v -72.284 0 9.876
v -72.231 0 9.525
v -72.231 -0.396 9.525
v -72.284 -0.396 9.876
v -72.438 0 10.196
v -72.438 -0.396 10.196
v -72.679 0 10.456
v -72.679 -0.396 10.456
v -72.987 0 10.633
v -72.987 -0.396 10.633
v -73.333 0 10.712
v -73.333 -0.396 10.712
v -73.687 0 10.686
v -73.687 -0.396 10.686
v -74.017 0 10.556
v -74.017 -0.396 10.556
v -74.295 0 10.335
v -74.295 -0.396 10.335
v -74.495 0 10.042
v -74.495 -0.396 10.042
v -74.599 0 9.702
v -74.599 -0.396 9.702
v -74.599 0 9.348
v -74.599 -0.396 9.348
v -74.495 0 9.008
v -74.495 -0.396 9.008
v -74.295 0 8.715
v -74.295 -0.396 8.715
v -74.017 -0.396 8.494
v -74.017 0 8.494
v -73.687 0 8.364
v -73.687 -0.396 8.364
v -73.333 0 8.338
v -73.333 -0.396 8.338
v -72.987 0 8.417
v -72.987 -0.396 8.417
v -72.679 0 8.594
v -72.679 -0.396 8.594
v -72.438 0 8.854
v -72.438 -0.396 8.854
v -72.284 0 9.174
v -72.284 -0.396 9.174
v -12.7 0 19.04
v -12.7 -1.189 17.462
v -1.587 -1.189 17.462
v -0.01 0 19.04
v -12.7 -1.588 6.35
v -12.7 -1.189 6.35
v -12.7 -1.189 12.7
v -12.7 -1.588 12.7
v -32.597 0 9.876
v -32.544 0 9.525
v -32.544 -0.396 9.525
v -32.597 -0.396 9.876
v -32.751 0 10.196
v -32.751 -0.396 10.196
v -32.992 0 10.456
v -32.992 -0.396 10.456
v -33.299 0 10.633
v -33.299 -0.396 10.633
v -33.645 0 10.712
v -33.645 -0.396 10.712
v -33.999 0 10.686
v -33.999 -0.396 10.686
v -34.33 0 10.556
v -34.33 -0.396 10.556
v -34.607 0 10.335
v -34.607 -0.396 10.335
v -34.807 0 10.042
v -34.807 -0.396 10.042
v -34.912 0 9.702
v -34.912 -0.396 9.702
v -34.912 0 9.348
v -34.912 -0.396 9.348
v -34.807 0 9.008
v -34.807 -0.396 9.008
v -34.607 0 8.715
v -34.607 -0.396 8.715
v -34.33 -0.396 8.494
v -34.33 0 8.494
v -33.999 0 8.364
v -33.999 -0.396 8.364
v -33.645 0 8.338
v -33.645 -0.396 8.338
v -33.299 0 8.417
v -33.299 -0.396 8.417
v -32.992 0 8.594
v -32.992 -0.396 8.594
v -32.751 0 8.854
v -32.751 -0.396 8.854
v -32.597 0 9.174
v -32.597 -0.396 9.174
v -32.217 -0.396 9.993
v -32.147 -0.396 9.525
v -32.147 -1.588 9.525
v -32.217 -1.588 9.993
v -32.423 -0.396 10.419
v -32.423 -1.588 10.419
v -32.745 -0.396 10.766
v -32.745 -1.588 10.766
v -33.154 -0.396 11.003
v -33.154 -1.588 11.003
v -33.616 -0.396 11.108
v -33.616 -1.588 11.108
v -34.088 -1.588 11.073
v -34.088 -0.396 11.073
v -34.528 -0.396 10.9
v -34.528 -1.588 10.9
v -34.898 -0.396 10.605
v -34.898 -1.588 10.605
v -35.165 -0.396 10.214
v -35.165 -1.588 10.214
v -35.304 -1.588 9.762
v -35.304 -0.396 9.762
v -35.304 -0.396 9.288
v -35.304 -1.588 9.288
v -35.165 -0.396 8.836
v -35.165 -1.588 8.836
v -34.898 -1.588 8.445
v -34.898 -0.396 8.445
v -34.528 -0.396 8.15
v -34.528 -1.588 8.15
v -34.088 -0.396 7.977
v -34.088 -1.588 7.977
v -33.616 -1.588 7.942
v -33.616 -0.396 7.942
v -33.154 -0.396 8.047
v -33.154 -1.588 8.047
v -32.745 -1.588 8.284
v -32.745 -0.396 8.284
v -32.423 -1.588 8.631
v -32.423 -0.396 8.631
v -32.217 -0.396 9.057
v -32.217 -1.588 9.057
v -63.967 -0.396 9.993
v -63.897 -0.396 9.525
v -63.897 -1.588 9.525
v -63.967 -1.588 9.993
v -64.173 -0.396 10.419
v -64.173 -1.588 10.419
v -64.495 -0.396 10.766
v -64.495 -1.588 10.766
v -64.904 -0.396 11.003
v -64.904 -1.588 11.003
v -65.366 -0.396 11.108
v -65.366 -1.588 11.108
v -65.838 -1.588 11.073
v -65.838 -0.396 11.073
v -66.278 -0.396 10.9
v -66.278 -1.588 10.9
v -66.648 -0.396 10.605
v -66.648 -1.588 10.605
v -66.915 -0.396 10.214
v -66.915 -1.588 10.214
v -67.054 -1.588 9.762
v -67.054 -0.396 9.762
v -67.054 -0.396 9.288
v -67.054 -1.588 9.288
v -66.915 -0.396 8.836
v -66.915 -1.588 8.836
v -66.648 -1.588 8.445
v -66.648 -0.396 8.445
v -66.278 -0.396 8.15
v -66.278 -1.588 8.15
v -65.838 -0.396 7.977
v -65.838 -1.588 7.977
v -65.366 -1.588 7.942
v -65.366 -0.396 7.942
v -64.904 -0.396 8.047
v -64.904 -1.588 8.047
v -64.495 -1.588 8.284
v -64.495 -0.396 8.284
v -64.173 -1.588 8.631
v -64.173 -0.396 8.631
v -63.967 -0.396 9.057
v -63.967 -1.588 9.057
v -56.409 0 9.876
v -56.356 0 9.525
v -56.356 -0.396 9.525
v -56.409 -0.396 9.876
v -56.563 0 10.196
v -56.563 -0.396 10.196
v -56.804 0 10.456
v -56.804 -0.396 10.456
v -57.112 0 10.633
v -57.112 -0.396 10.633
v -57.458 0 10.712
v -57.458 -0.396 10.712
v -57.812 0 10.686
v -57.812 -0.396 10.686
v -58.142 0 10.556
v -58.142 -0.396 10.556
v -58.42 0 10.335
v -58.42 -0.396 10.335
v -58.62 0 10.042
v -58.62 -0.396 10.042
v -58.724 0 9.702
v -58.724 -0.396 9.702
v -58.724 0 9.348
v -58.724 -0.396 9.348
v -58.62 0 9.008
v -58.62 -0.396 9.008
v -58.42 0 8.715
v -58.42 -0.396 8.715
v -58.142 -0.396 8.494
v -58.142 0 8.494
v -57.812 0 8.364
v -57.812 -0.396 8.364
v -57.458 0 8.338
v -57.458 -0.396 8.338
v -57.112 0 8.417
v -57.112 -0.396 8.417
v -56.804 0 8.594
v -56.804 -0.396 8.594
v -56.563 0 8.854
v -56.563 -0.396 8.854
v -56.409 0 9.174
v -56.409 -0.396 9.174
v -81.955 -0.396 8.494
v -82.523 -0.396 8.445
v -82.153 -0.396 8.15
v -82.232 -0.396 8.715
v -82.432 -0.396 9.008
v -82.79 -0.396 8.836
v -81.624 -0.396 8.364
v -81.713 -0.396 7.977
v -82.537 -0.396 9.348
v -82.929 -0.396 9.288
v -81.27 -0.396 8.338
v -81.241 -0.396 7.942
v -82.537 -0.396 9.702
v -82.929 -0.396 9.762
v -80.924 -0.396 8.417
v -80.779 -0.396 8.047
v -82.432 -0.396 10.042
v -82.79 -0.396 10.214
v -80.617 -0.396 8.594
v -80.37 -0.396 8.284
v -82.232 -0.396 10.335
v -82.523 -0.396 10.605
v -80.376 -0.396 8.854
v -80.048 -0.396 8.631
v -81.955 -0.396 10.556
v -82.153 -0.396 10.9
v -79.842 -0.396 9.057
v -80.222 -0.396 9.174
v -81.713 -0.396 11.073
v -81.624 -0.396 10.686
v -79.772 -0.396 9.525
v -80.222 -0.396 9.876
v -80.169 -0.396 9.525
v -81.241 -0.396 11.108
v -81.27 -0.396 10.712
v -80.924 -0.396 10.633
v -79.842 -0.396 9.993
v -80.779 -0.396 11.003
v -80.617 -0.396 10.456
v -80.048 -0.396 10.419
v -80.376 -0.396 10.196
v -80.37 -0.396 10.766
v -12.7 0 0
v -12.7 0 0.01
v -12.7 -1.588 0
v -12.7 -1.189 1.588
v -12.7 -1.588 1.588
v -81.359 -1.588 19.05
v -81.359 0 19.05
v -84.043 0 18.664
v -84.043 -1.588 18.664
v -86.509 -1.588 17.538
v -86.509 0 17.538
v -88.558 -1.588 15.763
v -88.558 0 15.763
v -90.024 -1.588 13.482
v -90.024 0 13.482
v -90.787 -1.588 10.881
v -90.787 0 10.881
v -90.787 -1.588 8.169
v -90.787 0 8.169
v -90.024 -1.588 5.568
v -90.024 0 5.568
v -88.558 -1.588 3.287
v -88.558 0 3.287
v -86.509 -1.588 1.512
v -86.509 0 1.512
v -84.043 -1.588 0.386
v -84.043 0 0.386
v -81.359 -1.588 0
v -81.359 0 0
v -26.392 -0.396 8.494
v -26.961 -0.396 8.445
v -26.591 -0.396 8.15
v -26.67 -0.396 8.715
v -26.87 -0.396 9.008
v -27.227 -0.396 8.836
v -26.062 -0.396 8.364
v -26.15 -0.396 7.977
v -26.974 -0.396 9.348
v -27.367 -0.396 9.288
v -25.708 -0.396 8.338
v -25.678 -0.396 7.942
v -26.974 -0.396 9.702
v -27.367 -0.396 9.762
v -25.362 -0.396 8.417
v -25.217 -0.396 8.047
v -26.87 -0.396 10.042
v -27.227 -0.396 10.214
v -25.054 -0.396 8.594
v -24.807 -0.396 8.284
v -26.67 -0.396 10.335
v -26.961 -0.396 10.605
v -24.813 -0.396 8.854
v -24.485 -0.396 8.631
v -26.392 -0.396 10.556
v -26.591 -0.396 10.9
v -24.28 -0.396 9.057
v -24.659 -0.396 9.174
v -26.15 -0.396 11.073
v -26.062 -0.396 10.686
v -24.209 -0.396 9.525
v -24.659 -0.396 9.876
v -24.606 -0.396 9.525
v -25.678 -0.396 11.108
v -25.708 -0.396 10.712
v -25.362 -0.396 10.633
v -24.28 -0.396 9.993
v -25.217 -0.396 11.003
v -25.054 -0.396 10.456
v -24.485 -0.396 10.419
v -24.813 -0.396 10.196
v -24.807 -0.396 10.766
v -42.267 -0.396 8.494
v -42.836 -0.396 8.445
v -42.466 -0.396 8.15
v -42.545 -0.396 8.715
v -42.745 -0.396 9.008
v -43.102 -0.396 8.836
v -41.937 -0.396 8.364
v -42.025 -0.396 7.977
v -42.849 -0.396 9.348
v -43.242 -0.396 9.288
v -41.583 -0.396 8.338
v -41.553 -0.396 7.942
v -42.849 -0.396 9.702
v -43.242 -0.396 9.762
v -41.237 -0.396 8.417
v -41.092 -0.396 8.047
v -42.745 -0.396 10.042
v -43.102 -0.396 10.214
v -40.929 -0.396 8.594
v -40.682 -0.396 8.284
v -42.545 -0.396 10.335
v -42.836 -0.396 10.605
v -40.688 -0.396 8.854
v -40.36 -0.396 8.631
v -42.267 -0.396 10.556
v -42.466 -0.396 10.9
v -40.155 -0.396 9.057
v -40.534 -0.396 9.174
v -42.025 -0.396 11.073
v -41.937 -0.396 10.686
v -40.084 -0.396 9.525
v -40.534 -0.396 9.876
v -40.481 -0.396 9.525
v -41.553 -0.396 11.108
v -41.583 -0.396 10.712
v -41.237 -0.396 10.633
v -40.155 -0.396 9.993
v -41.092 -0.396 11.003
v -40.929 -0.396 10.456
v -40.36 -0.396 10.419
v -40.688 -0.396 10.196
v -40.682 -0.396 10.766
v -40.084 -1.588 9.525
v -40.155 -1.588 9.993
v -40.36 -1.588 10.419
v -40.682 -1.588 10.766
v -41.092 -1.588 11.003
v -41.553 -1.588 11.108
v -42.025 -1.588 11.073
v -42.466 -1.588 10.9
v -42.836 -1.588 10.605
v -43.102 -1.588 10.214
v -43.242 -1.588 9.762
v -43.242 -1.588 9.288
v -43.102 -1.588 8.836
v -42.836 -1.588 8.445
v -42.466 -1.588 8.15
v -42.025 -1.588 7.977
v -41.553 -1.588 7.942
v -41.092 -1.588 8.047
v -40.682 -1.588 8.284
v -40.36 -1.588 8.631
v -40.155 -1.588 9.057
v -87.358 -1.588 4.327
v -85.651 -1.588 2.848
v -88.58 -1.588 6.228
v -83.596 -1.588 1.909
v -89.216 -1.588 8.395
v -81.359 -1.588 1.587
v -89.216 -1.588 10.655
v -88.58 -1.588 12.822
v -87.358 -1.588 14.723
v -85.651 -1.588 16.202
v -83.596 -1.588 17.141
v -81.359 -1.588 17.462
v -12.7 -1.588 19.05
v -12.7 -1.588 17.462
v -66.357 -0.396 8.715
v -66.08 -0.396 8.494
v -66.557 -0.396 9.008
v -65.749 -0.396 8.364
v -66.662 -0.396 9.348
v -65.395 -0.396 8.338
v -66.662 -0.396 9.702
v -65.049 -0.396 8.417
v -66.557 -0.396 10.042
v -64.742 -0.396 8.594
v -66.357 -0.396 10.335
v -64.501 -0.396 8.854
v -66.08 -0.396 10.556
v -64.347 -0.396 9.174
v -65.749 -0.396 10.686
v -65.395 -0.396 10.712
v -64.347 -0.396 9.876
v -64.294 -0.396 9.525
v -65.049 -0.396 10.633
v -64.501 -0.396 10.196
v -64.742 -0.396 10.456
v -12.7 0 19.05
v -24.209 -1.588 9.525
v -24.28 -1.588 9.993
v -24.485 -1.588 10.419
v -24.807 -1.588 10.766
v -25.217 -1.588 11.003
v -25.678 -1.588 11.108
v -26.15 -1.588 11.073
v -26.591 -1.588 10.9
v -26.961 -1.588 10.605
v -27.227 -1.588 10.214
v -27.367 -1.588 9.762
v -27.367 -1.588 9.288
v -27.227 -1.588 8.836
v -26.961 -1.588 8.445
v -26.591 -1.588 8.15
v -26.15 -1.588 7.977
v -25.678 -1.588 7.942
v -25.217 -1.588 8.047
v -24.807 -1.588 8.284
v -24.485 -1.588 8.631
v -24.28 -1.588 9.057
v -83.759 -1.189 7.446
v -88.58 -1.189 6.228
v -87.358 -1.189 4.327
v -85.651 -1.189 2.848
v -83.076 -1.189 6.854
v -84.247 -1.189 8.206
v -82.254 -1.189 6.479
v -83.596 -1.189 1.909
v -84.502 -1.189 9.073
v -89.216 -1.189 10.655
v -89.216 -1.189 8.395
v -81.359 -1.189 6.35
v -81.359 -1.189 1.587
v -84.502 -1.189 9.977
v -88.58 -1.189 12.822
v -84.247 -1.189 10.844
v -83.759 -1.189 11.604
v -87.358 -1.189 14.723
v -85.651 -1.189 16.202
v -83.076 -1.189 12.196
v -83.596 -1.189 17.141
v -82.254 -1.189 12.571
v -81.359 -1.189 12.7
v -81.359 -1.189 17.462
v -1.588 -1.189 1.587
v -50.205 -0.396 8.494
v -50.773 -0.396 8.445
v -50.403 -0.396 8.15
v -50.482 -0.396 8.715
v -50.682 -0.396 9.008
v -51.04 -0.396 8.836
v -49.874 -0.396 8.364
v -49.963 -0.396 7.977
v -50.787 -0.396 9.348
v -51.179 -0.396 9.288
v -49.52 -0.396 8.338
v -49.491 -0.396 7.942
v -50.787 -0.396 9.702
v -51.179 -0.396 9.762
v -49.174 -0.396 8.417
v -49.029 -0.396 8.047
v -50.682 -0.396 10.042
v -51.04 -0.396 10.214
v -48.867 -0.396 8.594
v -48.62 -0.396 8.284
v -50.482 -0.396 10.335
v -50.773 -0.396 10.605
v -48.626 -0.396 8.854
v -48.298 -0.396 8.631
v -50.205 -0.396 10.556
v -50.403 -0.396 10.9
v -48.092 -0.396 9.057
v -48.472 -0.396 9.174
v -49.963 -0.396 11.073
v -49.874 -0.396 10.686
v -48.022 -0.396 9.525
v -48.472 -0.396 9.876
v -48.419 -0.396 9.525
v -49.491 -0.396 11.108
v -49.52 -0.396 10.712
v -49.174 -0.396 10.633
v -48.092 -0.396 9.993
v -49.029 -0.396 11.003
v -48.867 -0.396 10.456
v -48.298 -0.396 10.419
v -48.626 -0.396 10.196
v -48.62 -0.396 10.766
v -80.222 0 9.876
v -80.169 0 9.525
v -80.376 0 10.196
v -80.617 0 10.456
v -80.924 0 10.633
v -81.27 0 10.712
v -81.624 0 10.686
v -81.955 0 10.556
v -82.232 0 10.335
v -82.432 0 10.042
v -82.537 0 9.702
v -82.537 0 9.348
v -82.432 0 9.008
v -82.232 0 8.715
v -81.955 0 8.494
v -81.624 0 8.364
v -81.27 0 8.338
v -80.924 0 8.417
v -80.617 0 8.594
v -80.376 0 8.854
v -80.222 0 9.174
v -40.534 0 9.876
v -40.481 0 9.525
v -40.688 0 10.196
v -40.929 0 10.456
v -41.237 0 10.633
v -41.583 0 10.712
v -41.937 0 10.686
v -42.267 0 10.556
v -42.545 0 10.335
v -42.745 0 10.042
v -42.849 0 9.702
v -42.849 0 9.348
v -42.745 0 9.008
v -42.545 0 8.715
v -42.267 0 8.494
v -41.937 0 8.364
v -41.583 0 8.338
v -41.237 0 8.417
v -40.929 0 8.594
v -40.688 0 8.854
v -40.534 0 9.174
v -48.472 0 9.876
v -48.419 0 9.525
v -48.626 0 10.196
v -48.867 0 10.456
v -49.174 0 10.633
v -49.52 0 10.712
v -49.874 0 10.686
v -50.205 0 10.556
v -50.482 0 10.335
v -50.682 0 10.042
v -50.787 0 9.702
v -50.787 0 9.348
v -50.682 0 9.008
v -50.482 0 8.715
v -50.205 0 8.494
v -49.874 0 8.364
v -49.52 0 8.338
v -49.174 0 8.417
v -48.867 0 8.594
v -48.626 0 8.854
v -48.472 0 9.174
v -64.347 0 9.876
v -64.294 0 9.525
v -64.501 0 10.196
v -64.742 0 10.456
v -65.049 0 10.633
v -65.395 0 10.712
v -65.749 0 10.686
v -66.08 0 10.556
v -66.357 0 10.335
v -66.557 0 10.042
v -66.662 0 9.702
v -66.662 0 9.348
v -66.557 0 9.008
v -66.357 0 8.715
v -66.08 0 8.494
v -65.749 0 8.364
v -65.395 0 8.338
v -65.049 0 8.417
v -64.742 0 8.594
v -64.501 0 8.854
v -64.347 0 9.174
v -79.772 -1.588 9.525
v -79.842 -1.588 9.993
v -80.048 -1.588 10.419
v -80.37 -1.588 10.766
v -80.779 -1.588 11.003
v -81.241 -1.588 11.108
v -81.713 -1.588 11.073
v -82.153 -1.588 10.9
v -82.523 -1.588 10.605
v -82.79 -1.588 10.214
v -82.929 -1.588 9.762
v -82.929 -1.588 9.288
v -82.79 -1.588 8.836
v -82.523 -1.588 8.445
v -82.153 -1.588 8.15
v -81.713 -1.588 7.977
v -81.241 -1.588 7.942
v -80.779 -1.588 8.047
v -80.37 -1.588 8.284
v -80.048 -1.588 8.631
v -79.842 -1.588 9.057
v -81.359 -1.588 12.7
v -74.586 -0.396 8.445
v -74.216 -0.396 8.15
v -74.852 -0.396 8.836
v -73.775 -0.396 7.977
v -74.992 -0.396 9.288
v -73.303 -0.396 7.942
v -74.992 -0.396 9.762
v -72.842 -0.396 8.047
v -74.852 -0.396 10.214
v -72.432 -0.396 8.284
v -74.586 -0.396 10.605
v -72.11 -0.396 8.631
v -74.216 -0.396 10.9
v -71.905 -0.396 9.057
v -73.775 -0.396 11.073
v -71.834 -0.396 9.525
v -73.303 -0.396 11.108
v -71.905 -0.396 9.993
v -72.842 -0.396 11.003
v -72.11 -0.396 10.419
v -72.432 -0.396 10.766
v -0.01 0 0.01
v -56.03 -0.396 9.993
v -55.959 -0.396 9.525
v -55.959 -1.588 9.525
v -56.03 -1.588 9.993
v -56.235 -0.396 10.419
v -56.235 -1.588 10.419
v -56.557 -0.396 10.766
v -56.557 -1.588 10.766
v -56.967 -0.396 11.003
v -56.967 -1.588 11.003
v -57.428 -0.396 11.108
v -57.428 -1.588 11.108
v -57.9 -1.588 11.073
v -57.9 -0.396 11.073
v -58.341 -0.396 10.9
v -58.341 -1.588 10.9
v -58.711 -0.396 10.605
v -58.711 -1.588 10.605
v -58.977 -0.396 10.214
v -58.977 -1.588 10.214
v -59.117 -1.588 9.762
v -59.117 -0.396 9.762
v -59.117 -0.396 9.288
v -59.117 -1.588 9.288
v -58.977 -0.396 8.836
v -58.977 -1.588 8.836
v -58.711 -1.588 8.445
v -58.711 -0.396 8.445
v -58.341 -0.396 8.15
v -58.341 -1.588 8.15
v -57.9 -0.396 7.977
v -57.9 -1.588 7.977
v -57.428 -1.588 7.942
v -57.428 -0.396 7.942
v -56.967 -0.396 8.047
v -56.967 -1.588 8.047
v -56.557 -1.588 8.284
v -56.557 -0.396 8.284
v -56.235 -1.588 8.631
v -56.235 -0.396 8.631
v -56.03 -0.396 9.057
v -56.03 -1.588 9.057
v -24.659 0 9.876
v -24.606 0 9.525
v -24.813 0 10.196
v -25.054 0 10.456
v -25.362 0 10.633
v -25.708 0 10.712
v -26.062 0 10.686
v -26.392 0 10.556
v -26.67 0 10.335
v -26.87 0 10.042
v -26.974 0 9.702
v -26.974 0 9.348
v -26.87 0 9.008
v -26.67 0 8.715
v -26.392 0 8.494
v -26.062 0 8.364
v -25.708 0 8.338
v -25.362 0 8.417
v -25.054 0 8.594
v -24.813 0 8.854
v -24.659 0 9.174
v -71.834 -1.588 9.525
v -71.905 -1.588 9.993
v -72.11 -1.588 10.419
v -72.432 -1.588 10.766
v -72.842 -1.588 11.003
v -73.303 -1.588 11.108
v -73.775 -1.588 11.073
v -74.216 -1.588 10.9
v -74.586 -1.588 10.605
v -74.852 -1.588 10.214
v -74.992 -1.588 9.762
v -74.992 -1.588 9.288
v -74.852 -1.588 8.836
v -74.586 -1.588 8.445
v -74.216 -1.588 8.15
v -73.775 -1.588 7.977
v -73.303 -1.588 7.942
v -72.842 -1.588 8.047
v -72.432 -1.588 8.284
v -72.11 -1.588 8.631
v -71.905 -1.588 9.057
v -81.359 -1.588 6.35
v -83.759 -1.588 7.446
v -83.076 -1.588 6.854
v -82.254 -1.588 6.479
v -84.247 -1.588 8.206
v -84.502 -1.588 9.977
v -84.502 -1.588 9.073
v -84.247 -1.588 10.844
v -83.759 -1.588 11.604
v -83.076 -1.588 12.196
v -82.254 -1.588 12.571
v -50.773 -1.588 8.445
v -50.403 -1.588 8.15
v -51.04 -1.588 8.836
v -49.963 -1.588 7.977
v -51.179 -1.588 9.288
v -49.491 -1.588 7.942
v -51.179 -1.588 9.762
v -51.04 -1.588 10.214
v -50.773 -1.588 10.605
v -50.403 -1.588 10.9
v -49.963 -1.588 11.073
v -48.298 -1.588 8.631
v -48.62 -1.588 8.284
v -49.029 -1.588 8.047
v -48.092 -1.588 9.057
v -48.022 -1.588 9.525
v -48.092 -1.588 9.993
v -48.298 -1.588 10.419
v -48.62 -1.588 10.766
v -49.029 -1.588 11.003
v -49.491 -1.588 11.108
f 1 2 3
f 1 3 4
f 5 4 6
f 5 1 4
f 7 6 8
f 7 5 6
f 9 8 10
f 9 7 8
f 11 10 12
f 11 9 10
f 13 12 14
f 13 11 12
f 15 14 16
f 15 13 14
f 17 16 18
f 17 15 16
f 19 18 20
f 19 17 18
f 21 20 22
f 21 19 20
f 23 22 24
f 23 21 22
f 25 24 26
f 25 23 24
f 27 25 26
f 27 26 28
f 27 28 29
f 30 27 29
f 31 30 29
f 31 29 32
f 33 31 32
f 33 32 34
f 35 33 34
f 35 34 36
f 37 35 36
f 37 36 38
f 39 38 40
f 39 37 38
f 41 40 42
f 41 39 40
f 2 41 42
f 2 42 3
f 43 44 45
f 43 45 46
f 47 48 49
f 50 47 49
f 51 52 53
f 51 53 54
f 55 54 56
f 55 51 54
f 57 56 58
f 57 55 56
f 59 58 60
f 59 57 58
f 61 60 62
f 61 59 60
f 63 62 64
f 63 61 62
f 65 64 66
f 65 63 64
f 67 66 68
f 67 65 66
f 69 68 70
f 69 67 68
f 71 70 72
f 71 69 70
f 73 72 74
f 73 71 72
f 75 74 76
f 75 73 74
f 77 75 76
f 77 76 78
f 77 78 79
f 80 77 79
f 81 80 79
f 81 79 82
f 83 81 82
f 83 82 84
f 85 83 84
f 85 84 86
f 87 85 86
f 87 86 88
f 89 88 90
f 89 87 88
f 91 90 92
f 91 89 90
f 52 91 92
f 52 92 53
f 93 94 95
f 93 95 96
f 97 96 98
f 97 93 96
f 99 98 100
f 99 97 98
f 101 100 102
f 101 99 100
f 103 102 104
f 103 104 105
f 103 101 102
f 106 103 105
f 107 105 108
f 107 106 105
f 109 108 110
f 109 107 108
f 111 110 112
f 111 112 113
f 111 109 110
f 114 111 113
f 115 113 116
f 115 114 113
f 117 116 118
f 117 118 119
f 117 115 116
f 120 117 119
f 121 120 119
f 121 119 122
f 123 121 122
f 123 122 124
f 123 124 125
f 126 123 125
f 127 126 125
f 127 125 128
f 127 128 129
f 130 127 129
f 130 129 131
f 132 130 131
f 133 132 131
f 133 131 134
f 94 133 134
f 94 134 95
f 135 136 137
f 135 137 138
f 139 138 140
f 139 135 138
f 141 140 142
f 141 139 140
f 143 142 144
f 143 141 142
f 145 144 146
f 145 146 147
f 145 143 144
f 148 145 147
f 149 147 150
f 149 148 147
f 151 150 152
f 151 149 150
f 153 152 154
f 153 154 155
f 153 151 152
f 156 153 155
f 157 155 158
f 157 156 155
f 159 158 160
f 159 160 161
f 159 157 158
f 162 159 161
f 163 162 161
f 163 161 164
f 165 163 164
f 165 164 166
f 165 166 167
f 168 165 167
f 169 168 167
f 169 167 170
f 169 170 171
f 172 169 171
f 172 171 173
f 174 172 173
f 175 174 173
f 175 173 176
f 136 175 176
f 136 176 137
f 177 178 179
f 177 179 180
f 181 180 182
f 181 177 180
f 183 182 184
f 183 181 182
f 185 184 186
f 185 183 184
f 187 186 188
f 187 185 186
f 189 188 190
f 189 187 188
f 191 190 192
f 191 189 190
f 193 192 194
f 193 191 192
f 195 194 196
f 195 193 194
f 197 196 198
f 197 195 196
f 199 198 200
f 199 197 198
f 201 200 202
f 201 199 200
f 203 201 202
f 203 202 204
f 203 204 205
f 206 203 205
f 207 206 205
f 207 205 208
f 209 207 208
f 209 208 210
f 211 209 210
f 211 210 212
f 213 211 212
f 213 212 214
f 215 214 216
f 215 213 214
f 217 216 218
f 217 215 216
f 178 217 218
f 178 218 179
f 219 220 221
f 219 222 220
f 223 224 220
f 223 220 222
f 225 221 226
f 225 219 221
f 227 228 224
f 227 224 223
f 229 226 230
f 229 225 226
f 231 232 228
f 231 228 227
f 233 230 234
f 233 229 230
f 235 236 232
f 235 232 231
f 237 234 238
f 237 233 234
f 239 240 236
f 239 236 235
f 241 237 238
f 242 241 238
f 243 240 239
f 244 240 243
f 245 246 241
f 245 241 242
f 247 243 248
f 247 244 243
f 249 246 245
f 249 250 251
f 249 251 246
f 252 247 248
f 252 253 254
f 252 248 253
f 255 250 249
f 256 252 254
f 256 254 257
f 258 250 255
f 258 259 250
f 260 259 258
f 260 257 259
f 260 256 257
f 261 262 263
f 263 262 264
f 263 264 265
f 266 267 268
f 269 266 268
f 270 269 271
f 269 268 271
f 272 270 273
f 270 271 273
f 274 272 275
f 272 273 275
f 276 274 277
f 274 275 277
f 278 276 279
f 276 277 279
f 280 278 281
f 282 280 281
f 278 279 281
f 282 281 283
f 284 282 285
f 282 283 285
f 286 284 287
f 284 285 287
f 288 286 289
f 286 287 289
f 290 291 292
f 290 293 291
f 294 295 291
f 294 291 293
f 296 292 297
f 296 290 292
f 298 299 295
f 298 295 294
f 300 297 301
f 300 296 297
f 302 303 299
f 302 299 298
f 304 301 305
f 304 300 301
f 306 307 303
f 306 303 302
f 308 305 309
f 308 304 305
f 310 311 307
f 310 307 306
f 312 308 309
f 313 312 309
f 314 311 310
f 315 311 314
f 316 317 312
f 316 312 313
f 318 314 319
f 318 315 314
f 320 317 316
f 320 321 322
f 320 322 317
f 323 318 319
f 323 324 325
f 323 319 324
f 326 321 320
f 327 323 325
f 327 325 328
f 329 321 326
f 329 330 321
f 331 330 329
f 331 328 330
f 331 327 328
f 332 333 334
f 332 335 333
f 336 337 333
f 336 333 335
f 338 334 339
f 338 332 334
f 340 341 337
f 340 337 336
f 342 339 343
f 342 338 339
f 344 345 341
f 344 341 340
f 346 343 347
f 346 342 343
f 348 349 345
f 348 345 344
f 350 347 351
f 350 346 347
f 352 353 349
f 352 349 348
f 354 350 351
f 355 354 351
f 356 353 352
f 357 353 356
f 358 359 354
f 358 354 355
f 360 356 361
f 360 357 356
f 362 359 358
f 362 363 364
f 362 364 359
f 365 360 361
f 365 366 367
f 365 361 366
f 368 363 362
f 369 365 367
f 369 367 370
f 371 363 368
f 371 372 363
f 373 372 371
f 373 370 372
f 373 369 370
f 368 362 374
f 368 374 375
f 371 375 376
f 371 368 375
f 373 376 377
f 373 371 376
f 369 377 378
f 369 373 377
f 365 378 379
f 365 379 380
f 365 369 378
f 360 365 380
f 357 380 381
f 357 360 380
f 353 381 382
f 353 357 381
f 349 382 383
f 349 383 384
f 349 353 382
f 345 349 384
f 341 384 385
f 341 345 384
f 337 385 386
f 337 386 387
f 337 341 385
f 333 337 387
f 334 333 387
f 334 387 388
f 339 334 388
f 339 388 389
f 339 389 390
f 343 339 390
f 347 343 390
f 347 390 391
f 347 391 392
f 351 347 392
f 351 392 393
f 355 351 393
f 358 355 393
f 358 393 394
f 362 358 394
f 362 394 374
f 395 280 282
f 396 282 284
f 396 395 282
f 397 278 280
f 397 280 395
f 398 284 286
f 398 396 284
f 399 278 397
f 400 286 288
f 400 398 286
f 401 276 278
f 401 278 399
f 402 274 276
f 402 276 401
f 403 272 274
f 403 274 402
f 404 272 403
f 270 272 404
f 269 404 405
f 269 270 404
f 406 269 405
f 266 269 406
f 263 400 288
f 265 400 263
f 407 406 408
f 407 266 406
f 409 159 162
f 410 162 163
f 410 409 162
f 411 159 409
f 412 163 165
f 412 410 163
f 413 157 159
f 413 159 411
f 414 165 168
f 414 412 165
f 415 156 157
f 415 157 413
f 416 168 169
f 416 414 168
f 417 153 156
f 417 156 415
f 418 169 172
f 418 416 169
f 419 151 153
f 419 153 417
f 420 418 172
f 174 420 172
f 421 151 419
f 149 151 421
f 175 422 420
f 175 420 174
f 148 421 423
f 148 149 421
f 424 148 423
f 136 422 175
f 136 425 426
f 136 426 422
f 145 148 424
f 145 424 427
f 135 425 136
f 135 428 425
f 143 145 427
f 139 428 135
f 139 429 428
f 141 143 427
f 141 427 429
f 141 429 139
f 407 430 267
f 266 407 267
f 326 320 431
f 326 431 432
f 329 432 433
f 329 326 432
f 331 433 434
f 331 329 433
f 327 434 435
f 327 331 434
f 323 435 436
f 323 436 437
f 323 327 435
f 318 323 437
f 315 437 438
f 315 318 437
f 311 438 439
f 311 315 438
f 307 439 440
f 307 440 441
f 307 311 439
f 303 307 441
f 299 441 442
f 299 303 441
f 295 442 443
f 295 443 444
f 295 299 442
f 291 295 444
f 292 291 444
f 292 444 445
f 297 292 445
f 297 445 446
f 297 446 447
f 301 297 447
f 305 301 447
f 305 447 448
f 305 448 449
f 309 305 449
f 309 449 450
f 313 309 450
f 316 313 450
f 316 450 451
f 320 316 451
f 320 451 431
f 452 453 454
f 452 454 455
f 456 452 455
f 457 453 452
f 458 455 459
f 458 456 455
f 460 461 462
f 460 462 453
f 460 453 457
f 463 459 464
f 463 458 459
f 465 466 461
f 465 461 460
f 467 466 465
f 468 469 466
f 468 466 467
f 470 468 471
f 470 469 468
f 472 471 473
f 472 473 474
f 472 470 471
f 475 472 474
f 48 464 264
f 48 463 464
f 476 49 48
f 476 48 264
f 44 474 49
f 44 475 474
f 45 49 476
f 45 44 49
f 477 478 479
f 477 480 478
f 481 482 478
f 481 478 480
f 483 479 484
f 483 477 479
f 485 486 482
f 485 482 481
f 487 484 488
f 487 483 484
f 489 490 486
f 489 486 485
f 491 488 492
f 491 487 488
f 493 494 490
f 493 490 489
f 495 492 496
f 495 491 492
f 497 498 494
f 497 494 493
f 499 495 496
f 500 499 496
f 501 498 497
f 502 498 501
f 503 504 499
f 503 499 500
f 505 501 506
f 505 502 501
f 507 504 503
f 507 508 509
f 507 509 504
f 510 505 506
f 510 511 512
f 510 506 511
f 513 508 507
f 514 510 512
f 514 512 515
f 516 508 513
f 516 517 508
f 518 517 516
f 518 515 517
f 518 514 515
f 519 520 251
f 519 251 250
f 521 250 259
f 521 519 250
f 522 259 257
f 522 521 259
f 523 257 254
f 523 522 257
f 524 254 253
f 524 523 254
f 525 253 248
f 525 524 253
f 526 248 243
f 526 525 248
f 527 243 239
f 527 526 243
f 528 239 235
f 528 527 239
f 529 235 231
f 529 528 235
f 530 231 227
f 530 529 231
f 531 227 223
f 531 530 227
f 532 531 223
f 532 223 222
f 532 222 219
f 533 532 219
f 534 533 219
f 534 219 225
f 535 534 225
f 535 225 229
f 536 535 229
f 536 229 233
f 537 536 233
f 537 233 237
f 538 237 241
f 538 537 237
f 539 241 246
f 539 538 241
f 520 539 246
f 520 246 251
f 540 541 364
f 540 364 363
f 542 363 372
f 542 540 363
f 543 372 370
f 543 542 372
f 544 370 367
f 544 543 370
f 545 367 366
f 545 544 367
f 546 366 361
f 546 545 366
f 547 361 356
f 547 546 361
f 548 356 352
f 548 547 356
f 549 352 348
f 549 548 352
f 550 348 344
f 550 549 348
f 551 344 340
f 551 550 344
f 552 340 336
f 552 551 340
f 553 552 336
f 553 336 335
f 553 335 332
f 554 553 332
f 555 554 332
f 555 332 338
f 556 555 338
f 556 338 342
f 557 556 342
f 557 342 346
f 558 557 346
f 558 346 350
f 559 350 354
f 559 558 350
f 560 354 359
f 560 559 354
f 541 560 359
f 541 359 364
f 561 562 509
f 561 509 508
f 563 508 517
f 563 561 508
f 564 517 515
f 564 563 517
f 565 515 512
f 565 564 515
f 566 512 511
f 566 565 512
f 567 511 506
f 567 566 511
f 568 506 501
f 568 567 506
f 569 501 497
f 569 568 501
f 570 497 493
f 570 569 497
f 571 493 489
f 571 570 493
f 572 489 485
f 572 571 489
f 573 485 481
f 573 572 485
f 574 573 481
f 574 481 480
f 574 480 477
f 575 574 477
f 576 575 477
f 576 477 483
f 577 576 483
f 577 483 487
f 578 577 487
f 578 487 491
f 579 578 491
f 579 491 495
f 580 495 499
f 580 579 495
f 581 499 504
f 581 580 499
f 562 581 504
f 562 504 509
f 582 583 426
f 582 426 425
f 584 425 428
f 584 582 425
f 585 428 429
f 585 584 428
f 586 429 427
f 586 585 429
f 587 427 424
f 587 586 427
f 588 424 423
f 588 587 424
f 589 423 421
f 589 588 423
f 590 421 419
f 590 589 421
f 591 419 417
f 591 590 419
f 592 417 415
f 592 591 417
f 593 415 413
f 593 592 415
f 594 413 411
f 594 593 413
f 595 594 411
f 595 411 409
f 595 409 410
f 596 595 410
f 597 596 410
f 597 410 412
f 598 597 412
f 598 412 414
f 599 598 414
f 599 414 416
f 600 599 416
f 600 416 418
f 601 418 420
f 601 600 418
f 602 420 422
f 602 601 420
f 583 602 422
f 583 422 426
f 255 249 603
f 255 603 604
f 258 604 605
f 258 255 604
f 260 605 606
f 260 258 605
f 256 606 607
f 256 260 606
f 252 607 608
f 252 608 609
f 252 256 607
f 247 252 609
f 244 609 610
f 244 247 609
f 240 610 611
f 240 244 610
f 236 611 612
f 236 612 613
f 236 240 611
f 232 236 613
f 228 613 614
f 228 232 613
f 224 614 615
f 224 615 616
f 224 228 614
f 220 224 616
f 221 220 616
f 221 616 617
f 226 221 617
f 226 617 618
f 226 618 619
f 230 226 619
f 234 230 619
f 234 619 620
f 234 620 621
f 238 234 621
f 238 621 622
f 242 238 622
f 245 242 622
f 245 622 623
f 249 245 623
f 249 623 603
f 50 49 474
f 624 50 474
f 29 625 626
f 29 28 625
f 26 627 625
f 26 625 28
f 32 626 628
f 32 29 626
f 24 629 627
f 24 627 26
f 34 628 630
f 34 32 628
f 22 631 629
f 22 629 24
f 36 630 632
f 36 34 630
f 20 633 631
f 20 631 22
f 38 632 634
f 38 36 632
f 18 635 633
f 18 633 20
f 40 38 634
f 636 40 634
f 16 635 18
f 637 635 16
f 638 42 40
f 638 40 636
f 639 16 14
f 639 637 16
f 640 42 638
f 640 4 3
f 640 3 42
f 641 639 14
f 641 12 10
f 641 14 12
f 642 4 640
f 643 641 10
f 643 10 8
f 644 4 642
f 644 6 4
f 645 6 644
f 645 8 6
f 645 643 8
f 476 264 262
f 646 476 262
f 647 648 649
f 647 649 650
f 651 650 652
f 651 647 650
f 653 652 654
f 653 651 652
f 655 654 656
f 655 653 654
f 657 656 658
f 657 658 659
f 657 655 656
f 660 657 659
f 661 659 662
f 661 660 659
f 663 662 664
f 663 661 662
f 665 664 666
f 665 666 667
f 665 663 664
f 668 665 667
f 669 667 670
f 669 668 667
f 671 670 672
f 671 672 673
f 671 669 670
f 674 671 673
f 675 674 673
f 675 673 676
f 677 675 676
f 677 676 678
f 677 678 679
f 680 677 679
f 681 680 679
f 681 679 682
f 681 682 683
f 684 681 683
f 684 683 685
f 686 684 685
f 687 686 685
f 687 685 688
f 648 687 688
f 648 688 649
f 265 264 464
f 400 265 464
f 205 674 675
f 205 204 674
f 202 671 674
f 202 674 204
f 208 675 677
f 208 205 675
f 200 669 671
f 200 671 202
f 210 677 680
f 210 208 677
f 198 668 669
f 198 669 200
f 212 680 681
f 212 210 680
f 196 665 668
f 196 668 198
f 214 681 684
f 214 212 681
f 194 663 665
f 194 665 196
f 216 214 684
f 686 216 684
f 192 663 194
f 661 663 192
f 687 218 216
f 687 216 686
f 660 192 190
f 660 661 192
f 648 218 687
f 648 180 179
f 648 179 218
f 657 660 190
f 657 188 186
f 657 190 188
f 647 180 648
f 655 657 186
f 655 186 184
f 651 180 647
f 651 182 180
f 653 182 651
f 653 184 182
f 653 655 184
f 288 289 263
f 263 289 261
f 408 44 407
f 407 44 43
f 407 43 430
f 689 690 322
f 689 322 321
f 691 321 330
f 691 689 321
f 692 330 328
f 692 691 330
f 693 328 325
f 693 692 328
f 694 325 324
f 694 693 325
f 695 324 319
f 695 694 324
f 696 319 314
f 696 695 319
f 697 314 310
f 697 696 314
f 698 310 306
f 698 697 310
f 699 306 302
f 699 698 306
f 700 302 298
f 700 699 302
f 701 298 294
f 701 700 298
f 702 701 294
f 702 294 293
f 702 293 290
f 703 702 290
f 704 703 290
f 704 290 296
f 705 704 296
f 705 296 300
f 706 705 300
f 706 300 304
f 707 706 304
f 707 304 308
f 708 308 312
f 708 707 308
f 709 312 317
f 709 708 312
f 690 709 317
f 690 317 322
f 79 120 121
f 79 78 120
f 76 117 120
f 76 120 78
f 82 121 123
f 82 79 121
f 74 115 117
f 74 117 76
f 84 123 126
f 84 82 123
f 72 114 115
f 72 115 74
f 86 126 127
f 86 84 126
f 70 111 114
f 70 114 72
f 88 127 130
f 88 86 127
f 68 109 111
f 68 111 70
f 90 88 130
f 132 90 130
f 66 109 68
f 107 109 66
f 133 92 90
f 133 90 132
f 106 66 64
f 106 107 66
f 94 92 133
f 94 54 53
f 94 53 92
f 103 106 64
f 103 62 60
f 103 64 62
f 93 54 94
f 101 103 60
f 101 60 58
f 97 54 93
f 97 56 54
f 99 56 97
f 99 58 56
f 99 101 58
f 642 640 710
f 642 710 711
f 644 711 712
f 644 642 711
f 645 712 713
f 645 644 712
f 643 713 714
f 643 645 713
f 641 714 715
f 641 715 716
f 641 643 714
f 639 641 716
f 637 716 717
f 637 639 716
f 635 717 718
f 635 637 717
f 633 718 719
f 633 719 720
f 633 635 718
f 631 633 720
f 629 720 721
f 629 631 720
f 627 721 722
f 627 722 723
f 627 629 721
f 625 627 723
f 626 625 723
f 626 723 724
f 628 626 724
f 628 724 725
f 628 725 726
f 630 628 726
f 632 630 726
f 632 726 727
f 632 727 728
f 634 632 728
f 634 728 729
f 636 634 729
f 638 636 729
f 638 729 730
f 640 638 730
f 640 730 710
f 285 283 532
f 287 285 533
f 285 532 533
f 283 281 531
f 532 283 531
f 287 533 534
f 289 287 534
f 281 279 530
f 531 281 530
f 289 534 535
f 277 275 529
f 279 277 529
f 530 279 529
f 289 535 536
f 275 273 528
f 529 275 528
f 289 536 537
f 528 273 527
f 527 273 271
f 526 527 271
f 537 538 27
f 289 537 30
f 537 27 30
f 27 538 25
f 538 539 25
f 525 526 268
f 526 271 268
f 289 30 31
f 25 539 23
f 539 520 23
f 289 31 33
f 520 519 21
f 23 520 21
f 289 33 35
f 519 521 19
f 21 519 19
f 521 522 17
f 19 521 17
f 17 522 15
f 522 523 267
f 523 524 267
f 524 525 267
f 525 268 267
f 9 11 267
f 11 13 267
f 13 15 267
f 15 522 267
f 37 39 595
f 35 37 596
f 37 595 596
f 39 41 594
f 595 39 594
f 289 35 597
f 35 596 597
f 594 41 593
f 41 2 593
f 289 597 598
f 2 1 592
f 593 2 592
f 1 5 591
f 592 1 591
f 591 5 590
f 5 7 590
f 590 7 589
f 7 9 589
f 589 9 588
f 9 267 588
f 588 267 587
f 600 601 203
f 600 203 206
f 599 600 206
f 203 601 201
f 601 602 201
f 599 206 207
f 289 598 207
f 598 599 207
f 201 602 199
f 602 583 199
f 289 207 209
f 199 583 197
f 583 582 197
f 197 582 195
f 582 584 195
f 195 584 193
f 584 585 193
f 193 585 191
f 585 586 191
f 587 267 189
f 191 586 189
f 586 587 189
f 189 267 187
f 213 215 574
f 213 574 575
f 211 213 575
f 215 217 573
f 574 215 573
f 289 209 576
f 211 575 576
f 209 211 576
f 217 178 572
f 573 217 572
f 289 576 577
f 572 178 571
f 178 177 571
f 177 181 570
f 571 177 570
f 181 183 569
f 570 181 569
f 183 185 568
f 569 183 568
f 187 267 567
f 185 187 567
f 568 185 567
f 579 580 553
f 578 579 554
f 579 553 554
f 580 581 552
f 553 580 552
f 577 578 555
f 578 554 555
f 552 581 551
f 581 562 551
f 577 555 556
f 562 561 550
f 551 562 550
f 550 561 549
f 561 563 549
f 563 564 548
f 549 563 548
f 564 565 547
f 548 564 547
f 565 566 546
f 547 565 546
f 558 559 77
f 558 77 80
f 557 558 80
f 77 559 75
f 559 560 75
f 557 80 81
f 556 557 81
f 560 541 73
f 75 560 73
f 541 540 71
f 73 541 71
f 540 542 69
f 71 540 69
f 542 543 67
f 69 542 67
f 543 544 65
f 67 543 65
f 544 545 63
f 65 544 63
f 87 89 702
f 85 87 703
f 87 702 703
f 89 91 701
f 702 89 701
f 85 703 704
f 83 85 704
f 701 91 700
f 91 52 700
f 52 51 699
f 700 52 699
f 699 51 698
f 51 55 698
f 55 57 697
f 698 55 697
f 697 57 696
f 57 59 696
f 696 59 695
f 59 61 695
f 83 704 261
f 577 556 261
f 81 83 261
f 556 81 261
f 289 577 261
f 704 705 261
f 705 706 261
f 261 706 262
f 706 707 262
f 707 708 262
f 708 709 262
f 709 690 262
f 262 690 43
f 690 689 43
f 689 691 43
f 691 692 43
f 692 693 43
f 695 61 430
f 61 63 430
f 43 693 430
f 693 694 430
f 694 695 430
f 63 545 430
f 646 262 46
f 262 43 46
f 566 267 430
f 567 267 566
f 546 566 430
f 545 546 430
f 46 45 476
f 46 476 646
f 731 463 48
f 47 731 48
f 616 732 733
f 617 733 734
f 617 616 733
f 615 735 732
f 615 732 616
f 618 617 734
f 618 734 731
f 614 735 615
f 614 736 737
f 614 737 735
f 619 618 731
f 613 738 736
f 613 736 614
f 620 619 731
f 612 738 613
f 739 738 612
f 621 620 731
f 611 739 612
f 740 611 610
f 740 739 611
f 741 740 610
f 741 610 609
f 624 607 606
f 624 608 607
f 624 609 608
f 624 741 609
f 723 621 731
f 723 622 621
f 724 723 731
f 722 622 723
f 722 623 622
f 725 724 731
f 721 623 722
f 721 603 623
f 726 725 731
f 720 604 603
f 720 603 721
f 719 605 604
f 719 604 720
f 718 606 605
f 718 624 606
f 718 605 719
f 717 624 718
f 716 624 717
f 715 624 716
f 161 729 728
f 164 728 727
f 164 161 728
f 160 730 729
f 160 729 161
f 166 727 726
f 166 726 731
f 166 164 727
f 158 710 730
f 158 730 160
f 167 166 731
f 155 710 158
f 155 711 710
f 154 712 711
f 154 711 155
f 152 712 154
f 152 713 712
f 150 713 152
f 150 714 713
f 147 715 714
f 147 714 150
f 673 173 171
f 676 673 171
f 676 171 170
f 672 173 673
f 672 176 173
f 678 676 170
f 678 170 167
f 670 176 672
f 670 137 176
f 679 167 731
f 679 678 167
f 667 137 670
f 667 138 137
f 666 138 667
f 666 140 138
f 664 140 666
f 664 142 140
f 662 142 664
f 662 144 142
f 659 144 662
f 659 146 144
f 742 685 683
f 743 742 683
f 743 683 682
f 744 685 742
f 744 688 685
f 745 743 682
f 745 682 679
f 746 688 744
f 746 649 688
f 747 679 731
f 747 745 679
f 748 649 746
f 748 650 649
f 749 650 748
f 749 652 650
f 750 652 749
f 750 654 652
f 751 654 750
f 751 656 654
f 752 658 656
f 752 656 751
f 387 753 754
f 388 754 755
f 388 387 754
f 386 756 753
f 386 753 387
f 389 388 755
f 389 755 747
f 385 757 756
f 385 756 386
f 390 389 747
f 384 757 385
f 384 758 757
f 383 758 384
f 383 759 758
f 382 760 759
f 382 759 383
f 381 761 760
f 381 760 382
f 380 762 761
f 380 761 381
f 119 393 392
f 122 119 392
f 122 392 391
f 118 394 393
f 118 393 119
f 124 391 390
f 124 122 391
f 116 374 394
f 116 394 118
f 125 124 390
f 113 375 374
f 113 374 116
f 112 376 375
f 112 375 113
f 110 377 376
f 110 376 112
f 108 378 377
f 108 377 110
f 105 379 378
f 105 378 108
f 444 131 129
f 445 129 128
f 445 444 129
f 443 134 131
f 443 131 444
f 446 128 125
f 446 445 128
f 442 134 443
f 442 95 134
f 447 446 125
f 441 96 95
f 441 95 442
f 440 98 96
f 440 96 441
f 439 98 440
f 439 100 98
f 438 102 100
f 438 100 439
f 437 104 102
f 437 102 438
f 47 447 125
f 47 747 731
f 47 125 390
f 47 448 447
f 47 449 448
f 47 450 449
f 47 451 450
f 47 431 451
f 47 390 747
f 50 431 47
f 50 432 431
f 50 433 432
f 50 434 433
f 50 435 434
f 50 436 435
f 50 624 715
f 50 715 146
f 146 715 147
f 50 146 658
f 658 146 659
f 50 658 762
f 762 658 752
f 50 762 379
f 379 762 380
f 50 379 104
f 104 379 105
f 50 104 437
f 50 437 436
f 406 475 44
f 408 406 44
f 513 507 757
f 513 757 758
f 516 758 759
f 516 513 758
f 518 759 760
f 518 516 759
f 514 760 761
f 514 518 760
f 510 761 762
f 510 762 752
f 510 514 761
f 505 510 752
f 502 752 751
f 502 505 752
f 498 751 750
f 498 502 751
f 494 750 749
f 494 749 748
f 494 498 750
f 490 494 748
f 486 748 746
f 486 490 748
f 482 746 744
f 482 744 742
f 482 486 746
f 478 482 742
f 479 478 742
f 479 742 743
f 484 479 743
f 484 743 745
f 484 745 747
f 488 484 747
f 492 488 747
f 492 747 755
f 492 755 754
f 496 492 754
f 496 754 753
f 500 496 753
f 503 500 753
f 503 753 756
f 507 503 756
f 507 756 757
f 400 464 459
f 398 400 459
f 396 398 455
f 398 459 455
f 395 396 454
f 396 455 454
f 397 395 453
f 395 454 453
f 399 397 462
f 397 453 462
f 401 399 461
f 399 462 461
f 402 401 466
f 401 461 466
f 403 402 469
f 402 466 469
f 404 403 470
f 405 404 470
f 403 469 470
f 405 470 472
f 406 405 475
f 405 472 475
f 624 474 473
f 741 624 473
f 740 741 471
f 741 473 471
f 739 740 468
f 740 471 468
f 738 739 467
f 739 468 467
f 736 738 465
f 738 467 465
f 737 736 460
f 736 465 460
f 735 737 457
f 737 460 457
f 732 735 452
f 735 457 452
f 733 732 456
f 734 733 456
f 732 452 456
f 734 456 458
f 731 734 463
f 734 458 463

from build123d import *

# Parameters (mm, degrees)
F1_DEPTH     = 1.5875
F2_DEPTH     = 1.18872
F0_R         = 1.5875
F3_DEPTH     = 1.5875
F0_R_2       = 1.190625
F4_DEPTH     = 0.39624
F5_DEPTH     = 1.18872
F6_T1_DEPTH  = 27.2432951274
F6_T6_DEPTH  = 16.7966475637
F6_T11_DEPTH = 16.7966475637


# Not quite as in the source:
# - a fillet or chamfer that OpenCascade refuses, or shapes differently, is made with other operations: its cross-section is extruded or revolved along the edge and cut away or added


with BuildPart() as f1:
    # F0 (on Front) → F1 (new body)
    with BuildSketch(Plane.XZ):
        with BuildLine():
            Line((-81.3593362805, 0), (-12.7, 0))
            Line((-12.7, 0), (-12.7, 1.5875))
            Line((-12.7, 1.5875), (-81.3593362805, 1.5875))
            ThreePointArc((-81.3593362805, 1.5875), (-89.2968362805, 9.525), (-81.3593362805, 17.4625))
            Line((-81.3593362805, 17.4625), (-12.7, 17.4625))
            Line((-12.7, 17.4625), (-12.7, 19.05))
            Line((-12.7, 19.05), (-81.3593362805, 19.05))
            ThreePointArc((-81.3593362805, 19.05), (-90.8843362805, 9.525), (-81.3593362805, 0))
        make_face()
    extrude(amount=F1_DEPTH)

    # F0 (on Front) → F2 (join)
    with BuildSketch(Plane.XZ):
        with BuildLine():
            Line((-81.3593362805, 1.5875), (-12.7, 1.5875))
            Line((-12.7, 1.5875), (-1.5875, 1.5875))
            Line((-1.5875, 1.5875), (-1.5875, 17.4625))
            Line((-1.5875, 17.4625), (-12.7, 17.4625))
            Line((-12.7, 17.4625), (-81.3593362805, 17.4625))
            ThreePointArc((-81.3593362805, 17.4625), (-89.2968362805, 9.525), (-81.3593362805, 1.5875))
        make_face()
        with BuildLine():
            ThreePointArc((-81.3593362805, 6.35), (-84.5343362805, 9.525), (-81.3593362805, 12.7))
            Line((-81.3593362805, 12.7), (-12.7, 12.7))
            Line((-12.7, 12.7), (-12.7, 6.35))
            Line((-12.7, 6.35), (-81.3593362805, 6.35))
        make_face(mode=Mode.SUBTRACT)
    extrude(amount=F2_DEPTH)

    # F0 (on Front) → F3 (join)
    with BuildSketch(Plane.XZ):
        with BuildLine():
            Line((-12.7, 12.7), (-81.3593362805, 12.7))
            ThreePointArc((-81.3593362805, 12.7), (-84.5343362805, 9.525), (-81.3593362805, 6.35))
            Line((-81.3593362805, 6.35), (-12.7, 6.35))
            Line((-12.7, 6.35), (-12.7, 12.7))
        make_face()
        with Locations((-81.3593362805, 9.525)):
            Circle(F0_R, mode=Mode.SUBTRACT)
        with Locations((-73.4218362805, 9.525)):
            Circle(F0_R, mode=Mode.SUBTRACT)
        with Locations((-65.4843362805, 9.525)):
            Circle(F0_R, mode=Mode.SUBTRACT)
        with Locations((-57.5468362805, 9.525)):
            Circle(F0_R, mode=Mode.SUBTRACT)
        with Locations((-49.6093362805, 9.525)):
            Circle(F0_R, mode=Mode.SUBTRACT)
        with Locations((-41.6718362805, 9.525)):
            Circle(F0_R, mode=Mode.SUBTRACT)
        with Locations((-33.7343362805, 9.525)):
            Circle(F0_R, mode=Mode.SUBTRACT)
        with Locations((-25.7968362805, 9.525)):
            Circle(F0_R, mode=Mode.SUBTRACT)
    extrude(amount=F3_DEPTH)

    # F0 (on Front) → F4 (join)
    with BuildSketch(Plane.XZ):
        with Locations((-81.3593362805, 9.525)):
            Circle(F0_R)
        with Locations((-81.3593362805, 9.525)):
            Circle(F0_R_2, mode=Mode.SUBTRACT)
        with Locations((-73.4218362805, 9.525)):
            Circle(F0_R)
        with Locations((-73.4218362805, 9.525)):
            Circle(F0_R_2, mode=Mode.SUBTRACT)
        with Locations((-65.4843362805, 9.525)):
            Circle(F0_R)
        with Locations((-65.4843362805, 9.525)):
            Circle(F0_R_2, mode=Mode.SUBTRACT)
        with Locations((-57.5468362805, 9.525)):
            Circle(F0_R)
        with Locations((-57.5468362805, 9.525)):
            Circle(F0_R_2, mode=Mode.SUBTRACT)
        with Locations((-49.6093362805, 9.525)):
            Circle(F0_R)
        with Locations((-49.6093362805, 9.525)):
            Circle(F0_R_2, mode=Mode.SUBTRACT)
        with Locations((-41.6718362805, 9.525)):
            Circle(F0_R)
        with Locations((-41.6718362805, 9.525)):
            Circle(F0_R_2, mode=Mode.SUBTRACT)
        with Locations((-33.7343362805, 9.525)):
            Circle(F0_R)
        with Locations((-33.7343362805, 9.525)):
            Circle(F0_R_2, mode=Mode.SUBTRACT)
        with Locations((-25.7968362805, 9.525)):
            Circle(F0_R)
        with Locations((-25.7968362805, 9.525)):
            Circle(F0_R_2, mode=Mode.SUBTRACT)
    extrude(amount=F4_DEPTH)

    # F0 (on Front) → F5 (join)
    with BuildSketch(Plane.XZ):
        Polygon((-12.7, 0), (0, 0), (0, 19.05), (-12.7, 19.05), (-12.7, 17.4625), (-1.5875, 17.4625), (-1.5875, 1.5875), (-12.7, 1.5875), align=None)
    extrude(amount=F5_DEPTH)

    # F6: chamfer of 1.5875 x 1.1962670545 on 3 edges, made by hand

    # F6_s2 → F6_t1 (cut)
    with BuildSketch(Plane.XY.offset(-4.0966475637)):
        Polygon((-1.5875, -1.18872), (0, 0.0075470545), (0, -1.18872), align=None)
    extrude(amount=F6_T1_DEPTH, mode=Mode.SUBTRACT)


with BuildPart() as f6_tool4:
    # F6_s5 → F6_t6 (new body)
    with BuildSketch(Plane.YZ.offset(4.0966475637)):
        Polygon((-1.18872, 17.4625), (0.0075470545, 19.05), (-1.18872, 19.05), align=None)
    extrude(amount=-F6_T6_DEPTH)

    split(bisect_by=Plane.XY.offset(17.4625), keep=Keep.TOP)


with BuildPart() as f1_1:
    add(f1.part)

    # F6_t3: cut F6_tool4
    add(f6_tool4.part, mode=Mode.SUBTRACT)


with BuildPart() as f6_tool9:
    # F6_s10 → F6_t11 (new body)
    with BuildSketch(Plane.YZ.offset(-12.7)):
        Polygon((-1.18872, 1.5875), (0.0075470545, 0), (-1.18872, 0), align=None)
    extrude(amount=F6_T11_DEPTH)

    split(bisect_by=Plane.XY.offset(1.5875), keep=Keep.BOTTOM)


with BuildPart() as f1_2:
    add(f1_1.part)

    # F6_t8: cut F6_tool9
    add(f6_tool9.part, mode=Mode.SUBTRACT)


solid = f1_2.part
